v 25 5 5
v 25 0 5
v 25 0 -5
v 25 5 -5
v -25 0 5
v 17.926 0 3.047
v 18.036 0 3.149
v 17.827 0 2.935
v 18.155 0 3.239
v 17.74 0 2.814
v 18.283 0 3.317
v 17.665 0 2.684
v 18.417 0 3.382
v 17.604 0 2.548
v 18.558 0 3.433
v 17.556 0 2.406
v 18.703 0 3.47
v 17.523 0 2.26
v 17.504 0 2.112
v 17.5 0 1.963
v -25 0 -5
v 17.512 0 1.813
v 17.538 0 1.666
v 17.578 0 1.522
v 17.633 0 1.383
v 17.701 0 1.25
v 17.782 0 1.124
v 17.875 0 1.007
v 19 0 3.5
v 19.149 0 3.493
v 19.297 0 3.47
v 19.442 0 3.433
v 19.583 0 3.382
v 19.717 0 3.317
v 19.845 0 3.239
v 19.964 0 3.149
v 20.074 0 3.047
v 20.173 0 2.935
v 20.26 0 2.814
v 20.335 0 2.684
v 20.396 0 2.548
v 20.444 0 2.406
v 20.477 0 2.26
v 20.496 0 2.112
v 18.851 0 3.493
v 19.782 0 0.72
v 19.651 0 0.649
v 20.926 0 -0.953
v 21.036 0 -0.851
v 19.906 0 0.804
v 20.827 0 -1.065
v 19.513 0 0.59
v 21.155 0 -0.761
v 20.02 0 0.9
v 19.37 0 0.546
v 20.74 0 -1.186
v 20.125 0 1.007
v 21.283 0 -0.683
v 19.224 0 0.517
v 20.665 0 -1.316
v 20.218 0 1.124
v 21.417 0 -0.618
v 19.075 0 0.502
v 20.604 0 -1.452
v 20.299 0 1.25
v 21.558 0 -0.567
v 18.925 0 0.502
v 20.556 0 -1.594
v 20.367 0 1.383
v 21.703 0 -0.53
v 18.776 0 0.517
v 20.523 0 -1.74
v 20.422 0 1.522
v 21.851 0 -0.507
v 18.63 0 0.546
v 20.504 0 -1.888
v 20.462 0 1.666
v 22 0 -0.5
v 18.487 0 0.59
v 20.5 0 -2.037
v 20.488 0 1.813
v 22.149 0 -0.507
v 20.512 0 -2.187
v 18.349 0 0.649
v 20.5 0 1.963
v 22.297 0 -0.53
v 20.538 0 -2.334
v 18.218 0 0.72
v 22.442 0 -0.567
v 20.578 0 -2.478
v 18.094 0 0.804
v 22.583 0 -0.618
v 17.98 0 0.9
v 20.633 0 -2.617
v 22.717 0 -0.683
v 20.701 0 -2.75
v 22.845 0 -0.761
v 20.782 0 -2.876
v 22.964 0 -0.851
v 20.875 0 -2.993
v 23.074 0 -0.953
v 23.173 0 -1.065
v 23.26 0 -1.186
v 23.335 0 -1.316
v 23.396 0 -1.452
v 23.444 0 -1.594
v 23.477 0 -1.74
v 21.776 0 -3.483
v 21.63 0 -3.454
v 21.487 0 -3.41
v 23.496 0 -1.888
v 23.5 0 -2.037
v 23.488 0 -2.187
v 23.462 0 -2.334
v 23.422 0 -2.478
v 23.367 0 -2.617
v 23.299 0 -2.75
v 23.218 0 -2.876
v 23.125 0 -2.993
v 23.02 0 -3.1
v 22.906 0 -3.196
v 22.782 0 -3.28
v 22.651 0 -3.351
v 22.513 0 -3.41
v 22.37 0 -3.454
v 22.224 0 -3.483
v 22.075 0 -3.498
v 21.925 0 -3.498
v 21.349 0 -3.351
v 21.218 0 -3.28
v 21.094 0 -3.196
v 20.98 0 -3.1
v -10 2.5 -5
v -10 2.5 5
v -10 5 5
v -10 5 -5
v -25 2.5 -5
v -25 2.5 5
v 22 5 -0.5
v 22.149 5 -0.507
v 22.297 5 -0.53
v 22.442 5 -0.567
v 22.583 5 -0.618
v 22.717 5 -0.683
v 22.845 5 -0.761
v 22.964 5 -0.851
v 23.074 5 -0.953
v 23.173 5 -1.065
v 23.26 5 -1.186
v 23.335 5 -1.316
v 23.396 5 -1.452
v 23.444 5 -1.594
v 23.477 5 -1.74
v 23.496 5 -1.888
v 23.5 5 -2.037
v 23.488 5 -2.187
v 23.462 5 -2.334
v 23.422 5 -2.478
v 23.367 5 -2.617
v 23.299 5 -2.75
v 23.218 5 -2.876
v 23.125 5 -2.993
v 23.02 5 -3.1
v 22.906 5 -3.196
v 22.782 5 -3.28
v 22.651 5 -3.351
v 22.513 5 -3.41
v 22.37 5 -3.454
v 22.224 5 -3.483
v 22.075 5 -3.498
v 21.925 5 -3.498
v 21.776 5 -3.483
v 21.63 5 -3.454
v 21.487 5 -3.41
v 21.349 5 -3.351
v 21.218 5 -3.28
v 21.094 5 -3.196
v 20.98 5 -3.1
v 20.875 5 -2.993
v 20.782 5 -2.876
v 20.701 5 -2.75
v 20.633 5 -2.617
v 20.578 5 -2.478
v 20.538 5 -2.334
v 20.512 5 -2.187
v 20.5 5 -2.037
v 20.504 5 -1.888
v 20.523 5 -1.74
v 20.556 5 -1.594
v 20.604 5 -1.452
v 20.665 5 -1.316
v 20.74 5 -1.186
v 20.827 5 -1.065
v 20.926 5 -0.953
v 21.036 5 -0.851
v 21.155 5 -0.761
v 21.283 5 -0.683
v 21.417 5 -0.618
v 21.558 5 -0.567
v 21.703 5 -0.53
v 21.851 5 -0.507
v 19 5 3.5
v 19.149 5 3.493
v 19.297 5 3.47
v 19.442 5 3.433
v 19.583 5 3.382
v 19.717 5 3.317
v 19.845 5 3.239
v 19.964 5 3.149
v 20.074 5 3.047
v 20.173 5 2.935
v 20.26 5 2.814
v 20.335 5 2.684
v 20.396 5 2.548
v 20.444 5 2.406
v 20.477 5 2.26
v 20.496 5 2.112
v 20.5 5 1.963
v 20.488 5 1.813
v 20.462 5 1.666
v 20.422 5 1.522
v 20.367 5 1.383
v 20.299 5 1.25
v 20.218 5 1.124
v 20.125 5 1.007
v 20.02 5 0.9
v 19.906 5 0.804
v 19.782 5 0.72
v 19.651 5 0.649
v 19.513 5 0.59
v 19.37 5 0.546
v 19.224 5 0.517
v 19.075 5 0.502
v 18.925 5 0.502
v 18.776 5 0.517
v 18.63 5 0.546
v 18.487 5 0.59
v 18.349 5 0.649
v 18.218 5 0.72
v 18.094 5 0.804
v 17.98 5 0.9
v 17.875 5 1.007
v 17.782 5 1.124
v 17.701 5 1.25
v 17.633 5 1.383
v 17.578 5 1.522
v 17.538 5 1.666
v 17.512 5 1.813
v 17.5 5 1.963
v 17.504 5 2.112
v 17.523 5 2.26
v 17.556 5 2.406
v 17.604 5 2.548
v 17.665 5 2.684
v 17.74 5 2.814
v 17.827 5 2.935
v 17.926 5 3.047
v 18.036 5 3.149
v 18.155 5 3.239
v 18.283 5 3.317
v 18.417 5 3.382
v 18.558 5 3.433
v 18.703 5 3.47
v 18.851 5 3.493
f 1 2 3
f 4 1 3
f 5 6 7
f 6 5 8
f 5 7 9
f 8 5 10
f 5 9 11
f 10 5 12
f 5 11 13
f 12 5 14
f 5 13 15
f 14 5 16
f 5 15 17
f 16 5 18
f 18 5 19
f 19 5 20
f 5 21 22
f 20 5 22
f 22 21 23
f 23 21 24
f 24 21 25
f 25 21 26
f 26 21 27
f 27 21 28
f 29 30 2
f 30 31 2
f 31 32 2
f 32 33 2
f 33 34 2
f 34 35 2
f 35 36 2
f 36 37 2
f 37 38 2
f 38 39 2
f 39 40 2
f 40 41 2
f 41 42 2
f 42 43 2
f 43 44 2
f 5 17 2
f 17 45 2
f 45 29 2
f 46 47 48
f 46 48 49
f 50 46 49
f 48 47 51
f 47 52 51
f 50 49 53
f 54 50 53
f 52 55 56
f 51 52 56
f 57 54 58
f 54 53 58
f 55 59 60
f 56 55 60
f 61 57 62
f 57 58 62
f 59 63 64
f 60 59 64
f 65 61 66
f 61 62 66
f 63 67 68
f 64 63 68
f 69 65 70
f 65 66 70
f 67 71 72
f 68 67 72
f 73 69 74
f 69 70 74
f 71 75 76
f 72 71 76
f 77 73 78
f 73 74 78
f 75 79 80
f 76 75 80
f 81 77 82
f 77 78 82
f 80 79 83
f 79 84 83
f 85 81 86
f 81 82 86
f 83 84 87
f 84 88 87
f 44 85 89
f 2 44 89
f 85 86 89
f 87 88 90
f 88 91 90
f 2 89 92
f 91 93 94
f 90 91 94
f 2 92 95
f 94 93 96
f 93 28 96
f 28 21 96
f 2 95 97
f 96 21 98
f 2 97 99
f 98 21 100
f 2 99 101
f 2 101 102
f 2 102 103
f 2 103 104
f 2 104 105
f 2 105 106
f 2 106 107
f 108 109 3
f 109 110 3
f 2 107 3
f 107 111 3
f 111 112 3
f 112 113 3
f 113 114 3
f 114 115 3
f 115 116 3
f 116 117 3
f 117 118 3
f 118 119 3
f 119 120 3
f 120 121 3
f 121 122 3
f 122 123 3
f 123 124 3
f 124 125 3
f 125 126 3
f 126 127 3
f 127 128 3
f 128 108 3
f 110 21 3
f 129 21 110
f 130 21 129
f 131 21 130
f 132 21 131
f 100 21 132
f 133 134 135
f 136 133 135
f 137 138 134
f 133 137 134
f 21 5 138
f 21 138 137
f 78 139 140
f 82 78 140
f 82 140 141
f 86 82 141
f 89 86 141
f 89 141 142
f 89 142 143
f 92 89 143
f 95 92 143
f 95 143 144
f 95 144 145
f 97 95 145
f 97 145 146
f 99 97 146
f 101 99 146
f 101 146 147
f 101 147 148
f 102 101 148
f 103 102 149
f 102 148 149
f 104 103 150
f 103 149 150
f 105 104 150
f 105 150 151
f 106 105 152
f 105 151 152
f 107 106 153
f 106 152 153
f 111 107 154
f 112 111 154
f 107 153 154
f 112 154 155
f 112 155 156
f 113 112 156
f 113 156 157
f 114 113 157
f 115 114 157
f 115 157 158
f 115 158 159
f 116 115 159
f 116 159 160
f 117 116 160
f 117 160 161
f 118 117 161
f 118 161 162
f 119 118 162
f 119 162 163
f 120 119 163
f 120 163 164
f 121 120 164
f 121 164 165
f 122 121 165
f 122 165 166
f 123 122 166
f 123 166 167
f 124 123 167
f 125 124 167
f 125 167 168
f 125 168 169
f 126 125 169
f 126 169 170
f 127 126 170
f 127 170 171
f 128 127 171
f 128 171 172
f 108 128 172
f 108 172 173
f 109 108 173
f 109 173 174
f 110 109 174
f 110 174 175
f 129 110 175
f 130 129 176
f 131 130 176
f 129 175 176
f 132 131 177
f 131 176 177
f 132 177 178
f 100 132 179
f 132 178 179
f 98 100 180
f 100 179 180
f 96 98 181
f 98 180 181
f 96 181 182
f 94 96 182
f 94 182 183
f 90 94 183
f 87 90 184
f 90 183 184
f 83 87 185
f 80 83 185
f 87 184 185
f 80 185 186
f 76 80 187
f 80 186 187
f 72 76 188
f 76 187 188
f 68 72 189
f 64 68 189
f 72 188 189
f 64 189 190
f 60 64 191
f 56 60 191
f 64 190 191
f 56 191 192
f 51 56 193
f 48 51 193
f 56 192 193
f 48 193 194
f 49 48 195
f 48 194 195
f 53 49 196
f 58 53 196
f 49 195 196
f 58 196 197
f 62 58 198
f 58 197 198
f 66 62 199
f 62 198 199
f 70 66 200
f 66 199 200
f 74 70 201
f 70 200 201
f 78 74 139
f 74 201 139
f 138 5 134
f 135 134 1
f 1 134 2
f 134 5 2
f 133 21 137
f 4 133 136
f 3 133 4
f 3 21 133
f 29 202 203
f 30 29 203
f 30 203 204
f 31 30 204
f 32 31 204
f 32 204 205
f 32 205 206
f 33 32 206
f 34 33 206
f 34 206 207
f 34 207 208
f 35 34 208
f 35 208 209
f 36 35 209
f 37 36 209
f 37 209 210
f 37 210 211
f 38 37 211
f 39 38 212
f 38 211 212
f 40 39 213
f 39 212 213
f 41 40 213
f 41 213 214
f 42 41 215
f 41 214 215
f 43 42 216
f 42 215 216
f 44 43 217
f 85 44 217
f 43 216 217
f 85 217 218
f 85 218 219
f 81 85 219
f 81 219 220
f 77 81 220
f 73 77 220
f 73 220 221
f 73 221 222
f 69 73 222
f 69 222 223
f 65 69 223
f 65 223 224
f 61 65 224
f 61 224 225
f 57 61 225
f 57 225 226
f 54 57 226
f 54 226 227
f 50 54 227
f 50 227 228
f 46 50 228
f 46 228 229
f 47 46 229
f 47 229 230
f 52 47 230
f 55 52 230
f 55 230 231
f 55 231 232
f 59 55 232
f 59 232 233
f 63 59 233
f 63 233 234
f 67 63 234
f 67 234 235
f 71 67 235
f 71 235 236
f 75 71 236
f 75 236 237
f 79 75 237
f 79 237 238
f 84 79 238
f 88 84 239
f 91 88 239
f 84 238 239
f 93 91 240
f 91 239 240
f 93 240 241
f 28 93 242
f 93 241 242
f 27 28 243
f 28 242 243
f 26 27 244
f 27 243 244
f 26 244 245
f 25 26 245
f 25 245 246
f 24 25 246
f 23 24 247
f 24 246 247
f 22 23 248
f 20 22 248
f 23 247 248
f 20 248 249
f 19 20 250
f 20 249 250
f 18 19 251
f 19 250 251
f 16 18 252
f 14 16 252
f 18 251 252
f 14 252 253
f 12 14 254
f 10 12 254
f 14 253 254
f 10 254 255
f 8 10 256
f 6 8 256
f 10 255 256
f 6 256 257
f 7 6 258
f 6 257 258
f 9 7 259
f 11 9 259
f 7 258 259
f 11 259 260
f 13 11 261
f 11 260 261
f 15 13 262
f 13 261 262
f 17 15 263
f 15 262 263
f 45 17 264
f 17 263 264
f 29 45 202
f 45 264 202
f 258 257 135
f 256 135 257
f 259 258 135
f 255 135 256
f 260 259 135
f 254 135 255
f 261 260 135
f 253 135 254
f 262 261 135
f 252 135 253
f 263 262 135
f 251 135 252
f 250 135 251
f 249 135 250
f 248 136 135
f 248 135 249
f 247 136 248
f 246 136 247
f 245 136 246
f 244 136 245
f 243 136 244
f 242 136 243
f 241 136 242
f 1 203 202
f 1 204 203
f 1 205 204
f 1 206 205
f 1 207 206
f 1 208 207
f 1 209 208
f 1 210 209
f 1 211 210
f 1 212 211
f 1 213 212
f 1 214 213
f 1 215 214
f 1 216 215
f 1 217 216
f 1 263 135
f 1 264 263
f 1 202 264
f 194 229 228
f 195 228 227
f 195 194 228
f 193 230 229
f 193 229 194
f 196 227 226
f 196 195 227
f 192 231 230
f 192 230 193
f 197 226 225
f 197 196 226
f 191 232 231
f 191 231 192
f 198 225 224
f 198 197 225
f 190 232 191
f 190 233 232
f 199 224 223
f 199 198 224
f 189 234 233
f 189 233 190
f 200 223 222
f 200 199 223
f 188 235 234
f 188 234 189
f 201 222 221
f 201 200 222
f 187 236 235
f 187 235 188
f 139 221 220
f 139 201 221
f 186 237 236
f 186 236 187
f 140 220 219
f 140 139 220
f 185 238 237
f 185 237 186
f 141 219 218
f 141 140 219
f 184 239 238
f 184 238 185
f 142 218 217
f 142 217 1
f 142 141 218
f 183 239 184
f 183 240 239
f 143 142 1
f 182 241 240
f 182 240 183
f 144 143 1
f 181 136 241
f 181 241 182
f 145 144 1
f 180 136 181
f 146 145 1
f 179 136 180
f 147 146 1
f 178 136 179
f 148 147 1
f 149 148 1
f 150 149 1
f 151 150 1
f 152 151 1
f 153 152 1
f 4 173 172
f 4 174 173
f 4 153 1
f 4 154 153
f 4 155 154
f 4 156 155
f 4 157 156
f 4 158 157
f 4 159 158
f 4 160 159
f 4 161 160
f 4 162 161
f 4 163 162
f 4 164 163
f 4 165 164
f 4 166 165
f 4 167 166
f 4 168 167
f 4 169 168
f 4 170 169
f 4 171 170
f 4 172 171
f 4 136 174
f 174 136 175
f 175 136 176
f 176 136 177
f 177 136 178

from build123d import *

# Parameters (mm, degrees)
SKETCH_1_W          = 50
SKETCH_1_H          = 10
EXTRUDE_1_DEPTH     = 5
SKETCH_2_R          = 1.5
CUT_EXTRUDE_1_DEPTH = 26.980762114
SKETCH_3_W          = 15
SKETCH_3_H          = 2.5
CUT_EXTRUDE_2_DEPTH = 28.386127875


with BuildPart() as part:
    # 草图1 → 凸台-拉伸1 (new body)
    with BuildSketch(Plane(origin=(0, 0, 0), x_dir=(1, 0, 0), z_dir=(0, 1, 0))):
        Rectangle(SKETCH_1_W, SKETCH_1_H)
    extrude(amount=EXTRUDE_1_DEPTH)

    # 草图2 → 切除-拉伸1 (cut, through all)
    with BuildSketch(Plane(origin=(0, 5, 0), x_dir=(1, 0, 0), z_dir=(0, 1, 0))):
        with Locations(Location((22, 2, 0), (0, 0, 270))):
            Circle(SKETCH_2_R)
        with Locations(Location((19, -2, 0), (0, 0, 270))):
            Circle(SKETCH_2_R)
    extrude(amount=-CUT_EXTRUDE_1_DEPTH, mode=Mode.SUBTRACT)

    # 草图3 → 切除-拉伸2 (cut, through all)
    with BuildSketch(Plane.XY.offset(5)):
        with Locations((-17.5, 3.75)):
            Rectangle(SKETCH_3_W, SKETCH_3_H)
    extrude(amount=-CUT_EXTRUDE_2_DEPTH, mode=Mode.SUBTRACT)


solid = part.part
